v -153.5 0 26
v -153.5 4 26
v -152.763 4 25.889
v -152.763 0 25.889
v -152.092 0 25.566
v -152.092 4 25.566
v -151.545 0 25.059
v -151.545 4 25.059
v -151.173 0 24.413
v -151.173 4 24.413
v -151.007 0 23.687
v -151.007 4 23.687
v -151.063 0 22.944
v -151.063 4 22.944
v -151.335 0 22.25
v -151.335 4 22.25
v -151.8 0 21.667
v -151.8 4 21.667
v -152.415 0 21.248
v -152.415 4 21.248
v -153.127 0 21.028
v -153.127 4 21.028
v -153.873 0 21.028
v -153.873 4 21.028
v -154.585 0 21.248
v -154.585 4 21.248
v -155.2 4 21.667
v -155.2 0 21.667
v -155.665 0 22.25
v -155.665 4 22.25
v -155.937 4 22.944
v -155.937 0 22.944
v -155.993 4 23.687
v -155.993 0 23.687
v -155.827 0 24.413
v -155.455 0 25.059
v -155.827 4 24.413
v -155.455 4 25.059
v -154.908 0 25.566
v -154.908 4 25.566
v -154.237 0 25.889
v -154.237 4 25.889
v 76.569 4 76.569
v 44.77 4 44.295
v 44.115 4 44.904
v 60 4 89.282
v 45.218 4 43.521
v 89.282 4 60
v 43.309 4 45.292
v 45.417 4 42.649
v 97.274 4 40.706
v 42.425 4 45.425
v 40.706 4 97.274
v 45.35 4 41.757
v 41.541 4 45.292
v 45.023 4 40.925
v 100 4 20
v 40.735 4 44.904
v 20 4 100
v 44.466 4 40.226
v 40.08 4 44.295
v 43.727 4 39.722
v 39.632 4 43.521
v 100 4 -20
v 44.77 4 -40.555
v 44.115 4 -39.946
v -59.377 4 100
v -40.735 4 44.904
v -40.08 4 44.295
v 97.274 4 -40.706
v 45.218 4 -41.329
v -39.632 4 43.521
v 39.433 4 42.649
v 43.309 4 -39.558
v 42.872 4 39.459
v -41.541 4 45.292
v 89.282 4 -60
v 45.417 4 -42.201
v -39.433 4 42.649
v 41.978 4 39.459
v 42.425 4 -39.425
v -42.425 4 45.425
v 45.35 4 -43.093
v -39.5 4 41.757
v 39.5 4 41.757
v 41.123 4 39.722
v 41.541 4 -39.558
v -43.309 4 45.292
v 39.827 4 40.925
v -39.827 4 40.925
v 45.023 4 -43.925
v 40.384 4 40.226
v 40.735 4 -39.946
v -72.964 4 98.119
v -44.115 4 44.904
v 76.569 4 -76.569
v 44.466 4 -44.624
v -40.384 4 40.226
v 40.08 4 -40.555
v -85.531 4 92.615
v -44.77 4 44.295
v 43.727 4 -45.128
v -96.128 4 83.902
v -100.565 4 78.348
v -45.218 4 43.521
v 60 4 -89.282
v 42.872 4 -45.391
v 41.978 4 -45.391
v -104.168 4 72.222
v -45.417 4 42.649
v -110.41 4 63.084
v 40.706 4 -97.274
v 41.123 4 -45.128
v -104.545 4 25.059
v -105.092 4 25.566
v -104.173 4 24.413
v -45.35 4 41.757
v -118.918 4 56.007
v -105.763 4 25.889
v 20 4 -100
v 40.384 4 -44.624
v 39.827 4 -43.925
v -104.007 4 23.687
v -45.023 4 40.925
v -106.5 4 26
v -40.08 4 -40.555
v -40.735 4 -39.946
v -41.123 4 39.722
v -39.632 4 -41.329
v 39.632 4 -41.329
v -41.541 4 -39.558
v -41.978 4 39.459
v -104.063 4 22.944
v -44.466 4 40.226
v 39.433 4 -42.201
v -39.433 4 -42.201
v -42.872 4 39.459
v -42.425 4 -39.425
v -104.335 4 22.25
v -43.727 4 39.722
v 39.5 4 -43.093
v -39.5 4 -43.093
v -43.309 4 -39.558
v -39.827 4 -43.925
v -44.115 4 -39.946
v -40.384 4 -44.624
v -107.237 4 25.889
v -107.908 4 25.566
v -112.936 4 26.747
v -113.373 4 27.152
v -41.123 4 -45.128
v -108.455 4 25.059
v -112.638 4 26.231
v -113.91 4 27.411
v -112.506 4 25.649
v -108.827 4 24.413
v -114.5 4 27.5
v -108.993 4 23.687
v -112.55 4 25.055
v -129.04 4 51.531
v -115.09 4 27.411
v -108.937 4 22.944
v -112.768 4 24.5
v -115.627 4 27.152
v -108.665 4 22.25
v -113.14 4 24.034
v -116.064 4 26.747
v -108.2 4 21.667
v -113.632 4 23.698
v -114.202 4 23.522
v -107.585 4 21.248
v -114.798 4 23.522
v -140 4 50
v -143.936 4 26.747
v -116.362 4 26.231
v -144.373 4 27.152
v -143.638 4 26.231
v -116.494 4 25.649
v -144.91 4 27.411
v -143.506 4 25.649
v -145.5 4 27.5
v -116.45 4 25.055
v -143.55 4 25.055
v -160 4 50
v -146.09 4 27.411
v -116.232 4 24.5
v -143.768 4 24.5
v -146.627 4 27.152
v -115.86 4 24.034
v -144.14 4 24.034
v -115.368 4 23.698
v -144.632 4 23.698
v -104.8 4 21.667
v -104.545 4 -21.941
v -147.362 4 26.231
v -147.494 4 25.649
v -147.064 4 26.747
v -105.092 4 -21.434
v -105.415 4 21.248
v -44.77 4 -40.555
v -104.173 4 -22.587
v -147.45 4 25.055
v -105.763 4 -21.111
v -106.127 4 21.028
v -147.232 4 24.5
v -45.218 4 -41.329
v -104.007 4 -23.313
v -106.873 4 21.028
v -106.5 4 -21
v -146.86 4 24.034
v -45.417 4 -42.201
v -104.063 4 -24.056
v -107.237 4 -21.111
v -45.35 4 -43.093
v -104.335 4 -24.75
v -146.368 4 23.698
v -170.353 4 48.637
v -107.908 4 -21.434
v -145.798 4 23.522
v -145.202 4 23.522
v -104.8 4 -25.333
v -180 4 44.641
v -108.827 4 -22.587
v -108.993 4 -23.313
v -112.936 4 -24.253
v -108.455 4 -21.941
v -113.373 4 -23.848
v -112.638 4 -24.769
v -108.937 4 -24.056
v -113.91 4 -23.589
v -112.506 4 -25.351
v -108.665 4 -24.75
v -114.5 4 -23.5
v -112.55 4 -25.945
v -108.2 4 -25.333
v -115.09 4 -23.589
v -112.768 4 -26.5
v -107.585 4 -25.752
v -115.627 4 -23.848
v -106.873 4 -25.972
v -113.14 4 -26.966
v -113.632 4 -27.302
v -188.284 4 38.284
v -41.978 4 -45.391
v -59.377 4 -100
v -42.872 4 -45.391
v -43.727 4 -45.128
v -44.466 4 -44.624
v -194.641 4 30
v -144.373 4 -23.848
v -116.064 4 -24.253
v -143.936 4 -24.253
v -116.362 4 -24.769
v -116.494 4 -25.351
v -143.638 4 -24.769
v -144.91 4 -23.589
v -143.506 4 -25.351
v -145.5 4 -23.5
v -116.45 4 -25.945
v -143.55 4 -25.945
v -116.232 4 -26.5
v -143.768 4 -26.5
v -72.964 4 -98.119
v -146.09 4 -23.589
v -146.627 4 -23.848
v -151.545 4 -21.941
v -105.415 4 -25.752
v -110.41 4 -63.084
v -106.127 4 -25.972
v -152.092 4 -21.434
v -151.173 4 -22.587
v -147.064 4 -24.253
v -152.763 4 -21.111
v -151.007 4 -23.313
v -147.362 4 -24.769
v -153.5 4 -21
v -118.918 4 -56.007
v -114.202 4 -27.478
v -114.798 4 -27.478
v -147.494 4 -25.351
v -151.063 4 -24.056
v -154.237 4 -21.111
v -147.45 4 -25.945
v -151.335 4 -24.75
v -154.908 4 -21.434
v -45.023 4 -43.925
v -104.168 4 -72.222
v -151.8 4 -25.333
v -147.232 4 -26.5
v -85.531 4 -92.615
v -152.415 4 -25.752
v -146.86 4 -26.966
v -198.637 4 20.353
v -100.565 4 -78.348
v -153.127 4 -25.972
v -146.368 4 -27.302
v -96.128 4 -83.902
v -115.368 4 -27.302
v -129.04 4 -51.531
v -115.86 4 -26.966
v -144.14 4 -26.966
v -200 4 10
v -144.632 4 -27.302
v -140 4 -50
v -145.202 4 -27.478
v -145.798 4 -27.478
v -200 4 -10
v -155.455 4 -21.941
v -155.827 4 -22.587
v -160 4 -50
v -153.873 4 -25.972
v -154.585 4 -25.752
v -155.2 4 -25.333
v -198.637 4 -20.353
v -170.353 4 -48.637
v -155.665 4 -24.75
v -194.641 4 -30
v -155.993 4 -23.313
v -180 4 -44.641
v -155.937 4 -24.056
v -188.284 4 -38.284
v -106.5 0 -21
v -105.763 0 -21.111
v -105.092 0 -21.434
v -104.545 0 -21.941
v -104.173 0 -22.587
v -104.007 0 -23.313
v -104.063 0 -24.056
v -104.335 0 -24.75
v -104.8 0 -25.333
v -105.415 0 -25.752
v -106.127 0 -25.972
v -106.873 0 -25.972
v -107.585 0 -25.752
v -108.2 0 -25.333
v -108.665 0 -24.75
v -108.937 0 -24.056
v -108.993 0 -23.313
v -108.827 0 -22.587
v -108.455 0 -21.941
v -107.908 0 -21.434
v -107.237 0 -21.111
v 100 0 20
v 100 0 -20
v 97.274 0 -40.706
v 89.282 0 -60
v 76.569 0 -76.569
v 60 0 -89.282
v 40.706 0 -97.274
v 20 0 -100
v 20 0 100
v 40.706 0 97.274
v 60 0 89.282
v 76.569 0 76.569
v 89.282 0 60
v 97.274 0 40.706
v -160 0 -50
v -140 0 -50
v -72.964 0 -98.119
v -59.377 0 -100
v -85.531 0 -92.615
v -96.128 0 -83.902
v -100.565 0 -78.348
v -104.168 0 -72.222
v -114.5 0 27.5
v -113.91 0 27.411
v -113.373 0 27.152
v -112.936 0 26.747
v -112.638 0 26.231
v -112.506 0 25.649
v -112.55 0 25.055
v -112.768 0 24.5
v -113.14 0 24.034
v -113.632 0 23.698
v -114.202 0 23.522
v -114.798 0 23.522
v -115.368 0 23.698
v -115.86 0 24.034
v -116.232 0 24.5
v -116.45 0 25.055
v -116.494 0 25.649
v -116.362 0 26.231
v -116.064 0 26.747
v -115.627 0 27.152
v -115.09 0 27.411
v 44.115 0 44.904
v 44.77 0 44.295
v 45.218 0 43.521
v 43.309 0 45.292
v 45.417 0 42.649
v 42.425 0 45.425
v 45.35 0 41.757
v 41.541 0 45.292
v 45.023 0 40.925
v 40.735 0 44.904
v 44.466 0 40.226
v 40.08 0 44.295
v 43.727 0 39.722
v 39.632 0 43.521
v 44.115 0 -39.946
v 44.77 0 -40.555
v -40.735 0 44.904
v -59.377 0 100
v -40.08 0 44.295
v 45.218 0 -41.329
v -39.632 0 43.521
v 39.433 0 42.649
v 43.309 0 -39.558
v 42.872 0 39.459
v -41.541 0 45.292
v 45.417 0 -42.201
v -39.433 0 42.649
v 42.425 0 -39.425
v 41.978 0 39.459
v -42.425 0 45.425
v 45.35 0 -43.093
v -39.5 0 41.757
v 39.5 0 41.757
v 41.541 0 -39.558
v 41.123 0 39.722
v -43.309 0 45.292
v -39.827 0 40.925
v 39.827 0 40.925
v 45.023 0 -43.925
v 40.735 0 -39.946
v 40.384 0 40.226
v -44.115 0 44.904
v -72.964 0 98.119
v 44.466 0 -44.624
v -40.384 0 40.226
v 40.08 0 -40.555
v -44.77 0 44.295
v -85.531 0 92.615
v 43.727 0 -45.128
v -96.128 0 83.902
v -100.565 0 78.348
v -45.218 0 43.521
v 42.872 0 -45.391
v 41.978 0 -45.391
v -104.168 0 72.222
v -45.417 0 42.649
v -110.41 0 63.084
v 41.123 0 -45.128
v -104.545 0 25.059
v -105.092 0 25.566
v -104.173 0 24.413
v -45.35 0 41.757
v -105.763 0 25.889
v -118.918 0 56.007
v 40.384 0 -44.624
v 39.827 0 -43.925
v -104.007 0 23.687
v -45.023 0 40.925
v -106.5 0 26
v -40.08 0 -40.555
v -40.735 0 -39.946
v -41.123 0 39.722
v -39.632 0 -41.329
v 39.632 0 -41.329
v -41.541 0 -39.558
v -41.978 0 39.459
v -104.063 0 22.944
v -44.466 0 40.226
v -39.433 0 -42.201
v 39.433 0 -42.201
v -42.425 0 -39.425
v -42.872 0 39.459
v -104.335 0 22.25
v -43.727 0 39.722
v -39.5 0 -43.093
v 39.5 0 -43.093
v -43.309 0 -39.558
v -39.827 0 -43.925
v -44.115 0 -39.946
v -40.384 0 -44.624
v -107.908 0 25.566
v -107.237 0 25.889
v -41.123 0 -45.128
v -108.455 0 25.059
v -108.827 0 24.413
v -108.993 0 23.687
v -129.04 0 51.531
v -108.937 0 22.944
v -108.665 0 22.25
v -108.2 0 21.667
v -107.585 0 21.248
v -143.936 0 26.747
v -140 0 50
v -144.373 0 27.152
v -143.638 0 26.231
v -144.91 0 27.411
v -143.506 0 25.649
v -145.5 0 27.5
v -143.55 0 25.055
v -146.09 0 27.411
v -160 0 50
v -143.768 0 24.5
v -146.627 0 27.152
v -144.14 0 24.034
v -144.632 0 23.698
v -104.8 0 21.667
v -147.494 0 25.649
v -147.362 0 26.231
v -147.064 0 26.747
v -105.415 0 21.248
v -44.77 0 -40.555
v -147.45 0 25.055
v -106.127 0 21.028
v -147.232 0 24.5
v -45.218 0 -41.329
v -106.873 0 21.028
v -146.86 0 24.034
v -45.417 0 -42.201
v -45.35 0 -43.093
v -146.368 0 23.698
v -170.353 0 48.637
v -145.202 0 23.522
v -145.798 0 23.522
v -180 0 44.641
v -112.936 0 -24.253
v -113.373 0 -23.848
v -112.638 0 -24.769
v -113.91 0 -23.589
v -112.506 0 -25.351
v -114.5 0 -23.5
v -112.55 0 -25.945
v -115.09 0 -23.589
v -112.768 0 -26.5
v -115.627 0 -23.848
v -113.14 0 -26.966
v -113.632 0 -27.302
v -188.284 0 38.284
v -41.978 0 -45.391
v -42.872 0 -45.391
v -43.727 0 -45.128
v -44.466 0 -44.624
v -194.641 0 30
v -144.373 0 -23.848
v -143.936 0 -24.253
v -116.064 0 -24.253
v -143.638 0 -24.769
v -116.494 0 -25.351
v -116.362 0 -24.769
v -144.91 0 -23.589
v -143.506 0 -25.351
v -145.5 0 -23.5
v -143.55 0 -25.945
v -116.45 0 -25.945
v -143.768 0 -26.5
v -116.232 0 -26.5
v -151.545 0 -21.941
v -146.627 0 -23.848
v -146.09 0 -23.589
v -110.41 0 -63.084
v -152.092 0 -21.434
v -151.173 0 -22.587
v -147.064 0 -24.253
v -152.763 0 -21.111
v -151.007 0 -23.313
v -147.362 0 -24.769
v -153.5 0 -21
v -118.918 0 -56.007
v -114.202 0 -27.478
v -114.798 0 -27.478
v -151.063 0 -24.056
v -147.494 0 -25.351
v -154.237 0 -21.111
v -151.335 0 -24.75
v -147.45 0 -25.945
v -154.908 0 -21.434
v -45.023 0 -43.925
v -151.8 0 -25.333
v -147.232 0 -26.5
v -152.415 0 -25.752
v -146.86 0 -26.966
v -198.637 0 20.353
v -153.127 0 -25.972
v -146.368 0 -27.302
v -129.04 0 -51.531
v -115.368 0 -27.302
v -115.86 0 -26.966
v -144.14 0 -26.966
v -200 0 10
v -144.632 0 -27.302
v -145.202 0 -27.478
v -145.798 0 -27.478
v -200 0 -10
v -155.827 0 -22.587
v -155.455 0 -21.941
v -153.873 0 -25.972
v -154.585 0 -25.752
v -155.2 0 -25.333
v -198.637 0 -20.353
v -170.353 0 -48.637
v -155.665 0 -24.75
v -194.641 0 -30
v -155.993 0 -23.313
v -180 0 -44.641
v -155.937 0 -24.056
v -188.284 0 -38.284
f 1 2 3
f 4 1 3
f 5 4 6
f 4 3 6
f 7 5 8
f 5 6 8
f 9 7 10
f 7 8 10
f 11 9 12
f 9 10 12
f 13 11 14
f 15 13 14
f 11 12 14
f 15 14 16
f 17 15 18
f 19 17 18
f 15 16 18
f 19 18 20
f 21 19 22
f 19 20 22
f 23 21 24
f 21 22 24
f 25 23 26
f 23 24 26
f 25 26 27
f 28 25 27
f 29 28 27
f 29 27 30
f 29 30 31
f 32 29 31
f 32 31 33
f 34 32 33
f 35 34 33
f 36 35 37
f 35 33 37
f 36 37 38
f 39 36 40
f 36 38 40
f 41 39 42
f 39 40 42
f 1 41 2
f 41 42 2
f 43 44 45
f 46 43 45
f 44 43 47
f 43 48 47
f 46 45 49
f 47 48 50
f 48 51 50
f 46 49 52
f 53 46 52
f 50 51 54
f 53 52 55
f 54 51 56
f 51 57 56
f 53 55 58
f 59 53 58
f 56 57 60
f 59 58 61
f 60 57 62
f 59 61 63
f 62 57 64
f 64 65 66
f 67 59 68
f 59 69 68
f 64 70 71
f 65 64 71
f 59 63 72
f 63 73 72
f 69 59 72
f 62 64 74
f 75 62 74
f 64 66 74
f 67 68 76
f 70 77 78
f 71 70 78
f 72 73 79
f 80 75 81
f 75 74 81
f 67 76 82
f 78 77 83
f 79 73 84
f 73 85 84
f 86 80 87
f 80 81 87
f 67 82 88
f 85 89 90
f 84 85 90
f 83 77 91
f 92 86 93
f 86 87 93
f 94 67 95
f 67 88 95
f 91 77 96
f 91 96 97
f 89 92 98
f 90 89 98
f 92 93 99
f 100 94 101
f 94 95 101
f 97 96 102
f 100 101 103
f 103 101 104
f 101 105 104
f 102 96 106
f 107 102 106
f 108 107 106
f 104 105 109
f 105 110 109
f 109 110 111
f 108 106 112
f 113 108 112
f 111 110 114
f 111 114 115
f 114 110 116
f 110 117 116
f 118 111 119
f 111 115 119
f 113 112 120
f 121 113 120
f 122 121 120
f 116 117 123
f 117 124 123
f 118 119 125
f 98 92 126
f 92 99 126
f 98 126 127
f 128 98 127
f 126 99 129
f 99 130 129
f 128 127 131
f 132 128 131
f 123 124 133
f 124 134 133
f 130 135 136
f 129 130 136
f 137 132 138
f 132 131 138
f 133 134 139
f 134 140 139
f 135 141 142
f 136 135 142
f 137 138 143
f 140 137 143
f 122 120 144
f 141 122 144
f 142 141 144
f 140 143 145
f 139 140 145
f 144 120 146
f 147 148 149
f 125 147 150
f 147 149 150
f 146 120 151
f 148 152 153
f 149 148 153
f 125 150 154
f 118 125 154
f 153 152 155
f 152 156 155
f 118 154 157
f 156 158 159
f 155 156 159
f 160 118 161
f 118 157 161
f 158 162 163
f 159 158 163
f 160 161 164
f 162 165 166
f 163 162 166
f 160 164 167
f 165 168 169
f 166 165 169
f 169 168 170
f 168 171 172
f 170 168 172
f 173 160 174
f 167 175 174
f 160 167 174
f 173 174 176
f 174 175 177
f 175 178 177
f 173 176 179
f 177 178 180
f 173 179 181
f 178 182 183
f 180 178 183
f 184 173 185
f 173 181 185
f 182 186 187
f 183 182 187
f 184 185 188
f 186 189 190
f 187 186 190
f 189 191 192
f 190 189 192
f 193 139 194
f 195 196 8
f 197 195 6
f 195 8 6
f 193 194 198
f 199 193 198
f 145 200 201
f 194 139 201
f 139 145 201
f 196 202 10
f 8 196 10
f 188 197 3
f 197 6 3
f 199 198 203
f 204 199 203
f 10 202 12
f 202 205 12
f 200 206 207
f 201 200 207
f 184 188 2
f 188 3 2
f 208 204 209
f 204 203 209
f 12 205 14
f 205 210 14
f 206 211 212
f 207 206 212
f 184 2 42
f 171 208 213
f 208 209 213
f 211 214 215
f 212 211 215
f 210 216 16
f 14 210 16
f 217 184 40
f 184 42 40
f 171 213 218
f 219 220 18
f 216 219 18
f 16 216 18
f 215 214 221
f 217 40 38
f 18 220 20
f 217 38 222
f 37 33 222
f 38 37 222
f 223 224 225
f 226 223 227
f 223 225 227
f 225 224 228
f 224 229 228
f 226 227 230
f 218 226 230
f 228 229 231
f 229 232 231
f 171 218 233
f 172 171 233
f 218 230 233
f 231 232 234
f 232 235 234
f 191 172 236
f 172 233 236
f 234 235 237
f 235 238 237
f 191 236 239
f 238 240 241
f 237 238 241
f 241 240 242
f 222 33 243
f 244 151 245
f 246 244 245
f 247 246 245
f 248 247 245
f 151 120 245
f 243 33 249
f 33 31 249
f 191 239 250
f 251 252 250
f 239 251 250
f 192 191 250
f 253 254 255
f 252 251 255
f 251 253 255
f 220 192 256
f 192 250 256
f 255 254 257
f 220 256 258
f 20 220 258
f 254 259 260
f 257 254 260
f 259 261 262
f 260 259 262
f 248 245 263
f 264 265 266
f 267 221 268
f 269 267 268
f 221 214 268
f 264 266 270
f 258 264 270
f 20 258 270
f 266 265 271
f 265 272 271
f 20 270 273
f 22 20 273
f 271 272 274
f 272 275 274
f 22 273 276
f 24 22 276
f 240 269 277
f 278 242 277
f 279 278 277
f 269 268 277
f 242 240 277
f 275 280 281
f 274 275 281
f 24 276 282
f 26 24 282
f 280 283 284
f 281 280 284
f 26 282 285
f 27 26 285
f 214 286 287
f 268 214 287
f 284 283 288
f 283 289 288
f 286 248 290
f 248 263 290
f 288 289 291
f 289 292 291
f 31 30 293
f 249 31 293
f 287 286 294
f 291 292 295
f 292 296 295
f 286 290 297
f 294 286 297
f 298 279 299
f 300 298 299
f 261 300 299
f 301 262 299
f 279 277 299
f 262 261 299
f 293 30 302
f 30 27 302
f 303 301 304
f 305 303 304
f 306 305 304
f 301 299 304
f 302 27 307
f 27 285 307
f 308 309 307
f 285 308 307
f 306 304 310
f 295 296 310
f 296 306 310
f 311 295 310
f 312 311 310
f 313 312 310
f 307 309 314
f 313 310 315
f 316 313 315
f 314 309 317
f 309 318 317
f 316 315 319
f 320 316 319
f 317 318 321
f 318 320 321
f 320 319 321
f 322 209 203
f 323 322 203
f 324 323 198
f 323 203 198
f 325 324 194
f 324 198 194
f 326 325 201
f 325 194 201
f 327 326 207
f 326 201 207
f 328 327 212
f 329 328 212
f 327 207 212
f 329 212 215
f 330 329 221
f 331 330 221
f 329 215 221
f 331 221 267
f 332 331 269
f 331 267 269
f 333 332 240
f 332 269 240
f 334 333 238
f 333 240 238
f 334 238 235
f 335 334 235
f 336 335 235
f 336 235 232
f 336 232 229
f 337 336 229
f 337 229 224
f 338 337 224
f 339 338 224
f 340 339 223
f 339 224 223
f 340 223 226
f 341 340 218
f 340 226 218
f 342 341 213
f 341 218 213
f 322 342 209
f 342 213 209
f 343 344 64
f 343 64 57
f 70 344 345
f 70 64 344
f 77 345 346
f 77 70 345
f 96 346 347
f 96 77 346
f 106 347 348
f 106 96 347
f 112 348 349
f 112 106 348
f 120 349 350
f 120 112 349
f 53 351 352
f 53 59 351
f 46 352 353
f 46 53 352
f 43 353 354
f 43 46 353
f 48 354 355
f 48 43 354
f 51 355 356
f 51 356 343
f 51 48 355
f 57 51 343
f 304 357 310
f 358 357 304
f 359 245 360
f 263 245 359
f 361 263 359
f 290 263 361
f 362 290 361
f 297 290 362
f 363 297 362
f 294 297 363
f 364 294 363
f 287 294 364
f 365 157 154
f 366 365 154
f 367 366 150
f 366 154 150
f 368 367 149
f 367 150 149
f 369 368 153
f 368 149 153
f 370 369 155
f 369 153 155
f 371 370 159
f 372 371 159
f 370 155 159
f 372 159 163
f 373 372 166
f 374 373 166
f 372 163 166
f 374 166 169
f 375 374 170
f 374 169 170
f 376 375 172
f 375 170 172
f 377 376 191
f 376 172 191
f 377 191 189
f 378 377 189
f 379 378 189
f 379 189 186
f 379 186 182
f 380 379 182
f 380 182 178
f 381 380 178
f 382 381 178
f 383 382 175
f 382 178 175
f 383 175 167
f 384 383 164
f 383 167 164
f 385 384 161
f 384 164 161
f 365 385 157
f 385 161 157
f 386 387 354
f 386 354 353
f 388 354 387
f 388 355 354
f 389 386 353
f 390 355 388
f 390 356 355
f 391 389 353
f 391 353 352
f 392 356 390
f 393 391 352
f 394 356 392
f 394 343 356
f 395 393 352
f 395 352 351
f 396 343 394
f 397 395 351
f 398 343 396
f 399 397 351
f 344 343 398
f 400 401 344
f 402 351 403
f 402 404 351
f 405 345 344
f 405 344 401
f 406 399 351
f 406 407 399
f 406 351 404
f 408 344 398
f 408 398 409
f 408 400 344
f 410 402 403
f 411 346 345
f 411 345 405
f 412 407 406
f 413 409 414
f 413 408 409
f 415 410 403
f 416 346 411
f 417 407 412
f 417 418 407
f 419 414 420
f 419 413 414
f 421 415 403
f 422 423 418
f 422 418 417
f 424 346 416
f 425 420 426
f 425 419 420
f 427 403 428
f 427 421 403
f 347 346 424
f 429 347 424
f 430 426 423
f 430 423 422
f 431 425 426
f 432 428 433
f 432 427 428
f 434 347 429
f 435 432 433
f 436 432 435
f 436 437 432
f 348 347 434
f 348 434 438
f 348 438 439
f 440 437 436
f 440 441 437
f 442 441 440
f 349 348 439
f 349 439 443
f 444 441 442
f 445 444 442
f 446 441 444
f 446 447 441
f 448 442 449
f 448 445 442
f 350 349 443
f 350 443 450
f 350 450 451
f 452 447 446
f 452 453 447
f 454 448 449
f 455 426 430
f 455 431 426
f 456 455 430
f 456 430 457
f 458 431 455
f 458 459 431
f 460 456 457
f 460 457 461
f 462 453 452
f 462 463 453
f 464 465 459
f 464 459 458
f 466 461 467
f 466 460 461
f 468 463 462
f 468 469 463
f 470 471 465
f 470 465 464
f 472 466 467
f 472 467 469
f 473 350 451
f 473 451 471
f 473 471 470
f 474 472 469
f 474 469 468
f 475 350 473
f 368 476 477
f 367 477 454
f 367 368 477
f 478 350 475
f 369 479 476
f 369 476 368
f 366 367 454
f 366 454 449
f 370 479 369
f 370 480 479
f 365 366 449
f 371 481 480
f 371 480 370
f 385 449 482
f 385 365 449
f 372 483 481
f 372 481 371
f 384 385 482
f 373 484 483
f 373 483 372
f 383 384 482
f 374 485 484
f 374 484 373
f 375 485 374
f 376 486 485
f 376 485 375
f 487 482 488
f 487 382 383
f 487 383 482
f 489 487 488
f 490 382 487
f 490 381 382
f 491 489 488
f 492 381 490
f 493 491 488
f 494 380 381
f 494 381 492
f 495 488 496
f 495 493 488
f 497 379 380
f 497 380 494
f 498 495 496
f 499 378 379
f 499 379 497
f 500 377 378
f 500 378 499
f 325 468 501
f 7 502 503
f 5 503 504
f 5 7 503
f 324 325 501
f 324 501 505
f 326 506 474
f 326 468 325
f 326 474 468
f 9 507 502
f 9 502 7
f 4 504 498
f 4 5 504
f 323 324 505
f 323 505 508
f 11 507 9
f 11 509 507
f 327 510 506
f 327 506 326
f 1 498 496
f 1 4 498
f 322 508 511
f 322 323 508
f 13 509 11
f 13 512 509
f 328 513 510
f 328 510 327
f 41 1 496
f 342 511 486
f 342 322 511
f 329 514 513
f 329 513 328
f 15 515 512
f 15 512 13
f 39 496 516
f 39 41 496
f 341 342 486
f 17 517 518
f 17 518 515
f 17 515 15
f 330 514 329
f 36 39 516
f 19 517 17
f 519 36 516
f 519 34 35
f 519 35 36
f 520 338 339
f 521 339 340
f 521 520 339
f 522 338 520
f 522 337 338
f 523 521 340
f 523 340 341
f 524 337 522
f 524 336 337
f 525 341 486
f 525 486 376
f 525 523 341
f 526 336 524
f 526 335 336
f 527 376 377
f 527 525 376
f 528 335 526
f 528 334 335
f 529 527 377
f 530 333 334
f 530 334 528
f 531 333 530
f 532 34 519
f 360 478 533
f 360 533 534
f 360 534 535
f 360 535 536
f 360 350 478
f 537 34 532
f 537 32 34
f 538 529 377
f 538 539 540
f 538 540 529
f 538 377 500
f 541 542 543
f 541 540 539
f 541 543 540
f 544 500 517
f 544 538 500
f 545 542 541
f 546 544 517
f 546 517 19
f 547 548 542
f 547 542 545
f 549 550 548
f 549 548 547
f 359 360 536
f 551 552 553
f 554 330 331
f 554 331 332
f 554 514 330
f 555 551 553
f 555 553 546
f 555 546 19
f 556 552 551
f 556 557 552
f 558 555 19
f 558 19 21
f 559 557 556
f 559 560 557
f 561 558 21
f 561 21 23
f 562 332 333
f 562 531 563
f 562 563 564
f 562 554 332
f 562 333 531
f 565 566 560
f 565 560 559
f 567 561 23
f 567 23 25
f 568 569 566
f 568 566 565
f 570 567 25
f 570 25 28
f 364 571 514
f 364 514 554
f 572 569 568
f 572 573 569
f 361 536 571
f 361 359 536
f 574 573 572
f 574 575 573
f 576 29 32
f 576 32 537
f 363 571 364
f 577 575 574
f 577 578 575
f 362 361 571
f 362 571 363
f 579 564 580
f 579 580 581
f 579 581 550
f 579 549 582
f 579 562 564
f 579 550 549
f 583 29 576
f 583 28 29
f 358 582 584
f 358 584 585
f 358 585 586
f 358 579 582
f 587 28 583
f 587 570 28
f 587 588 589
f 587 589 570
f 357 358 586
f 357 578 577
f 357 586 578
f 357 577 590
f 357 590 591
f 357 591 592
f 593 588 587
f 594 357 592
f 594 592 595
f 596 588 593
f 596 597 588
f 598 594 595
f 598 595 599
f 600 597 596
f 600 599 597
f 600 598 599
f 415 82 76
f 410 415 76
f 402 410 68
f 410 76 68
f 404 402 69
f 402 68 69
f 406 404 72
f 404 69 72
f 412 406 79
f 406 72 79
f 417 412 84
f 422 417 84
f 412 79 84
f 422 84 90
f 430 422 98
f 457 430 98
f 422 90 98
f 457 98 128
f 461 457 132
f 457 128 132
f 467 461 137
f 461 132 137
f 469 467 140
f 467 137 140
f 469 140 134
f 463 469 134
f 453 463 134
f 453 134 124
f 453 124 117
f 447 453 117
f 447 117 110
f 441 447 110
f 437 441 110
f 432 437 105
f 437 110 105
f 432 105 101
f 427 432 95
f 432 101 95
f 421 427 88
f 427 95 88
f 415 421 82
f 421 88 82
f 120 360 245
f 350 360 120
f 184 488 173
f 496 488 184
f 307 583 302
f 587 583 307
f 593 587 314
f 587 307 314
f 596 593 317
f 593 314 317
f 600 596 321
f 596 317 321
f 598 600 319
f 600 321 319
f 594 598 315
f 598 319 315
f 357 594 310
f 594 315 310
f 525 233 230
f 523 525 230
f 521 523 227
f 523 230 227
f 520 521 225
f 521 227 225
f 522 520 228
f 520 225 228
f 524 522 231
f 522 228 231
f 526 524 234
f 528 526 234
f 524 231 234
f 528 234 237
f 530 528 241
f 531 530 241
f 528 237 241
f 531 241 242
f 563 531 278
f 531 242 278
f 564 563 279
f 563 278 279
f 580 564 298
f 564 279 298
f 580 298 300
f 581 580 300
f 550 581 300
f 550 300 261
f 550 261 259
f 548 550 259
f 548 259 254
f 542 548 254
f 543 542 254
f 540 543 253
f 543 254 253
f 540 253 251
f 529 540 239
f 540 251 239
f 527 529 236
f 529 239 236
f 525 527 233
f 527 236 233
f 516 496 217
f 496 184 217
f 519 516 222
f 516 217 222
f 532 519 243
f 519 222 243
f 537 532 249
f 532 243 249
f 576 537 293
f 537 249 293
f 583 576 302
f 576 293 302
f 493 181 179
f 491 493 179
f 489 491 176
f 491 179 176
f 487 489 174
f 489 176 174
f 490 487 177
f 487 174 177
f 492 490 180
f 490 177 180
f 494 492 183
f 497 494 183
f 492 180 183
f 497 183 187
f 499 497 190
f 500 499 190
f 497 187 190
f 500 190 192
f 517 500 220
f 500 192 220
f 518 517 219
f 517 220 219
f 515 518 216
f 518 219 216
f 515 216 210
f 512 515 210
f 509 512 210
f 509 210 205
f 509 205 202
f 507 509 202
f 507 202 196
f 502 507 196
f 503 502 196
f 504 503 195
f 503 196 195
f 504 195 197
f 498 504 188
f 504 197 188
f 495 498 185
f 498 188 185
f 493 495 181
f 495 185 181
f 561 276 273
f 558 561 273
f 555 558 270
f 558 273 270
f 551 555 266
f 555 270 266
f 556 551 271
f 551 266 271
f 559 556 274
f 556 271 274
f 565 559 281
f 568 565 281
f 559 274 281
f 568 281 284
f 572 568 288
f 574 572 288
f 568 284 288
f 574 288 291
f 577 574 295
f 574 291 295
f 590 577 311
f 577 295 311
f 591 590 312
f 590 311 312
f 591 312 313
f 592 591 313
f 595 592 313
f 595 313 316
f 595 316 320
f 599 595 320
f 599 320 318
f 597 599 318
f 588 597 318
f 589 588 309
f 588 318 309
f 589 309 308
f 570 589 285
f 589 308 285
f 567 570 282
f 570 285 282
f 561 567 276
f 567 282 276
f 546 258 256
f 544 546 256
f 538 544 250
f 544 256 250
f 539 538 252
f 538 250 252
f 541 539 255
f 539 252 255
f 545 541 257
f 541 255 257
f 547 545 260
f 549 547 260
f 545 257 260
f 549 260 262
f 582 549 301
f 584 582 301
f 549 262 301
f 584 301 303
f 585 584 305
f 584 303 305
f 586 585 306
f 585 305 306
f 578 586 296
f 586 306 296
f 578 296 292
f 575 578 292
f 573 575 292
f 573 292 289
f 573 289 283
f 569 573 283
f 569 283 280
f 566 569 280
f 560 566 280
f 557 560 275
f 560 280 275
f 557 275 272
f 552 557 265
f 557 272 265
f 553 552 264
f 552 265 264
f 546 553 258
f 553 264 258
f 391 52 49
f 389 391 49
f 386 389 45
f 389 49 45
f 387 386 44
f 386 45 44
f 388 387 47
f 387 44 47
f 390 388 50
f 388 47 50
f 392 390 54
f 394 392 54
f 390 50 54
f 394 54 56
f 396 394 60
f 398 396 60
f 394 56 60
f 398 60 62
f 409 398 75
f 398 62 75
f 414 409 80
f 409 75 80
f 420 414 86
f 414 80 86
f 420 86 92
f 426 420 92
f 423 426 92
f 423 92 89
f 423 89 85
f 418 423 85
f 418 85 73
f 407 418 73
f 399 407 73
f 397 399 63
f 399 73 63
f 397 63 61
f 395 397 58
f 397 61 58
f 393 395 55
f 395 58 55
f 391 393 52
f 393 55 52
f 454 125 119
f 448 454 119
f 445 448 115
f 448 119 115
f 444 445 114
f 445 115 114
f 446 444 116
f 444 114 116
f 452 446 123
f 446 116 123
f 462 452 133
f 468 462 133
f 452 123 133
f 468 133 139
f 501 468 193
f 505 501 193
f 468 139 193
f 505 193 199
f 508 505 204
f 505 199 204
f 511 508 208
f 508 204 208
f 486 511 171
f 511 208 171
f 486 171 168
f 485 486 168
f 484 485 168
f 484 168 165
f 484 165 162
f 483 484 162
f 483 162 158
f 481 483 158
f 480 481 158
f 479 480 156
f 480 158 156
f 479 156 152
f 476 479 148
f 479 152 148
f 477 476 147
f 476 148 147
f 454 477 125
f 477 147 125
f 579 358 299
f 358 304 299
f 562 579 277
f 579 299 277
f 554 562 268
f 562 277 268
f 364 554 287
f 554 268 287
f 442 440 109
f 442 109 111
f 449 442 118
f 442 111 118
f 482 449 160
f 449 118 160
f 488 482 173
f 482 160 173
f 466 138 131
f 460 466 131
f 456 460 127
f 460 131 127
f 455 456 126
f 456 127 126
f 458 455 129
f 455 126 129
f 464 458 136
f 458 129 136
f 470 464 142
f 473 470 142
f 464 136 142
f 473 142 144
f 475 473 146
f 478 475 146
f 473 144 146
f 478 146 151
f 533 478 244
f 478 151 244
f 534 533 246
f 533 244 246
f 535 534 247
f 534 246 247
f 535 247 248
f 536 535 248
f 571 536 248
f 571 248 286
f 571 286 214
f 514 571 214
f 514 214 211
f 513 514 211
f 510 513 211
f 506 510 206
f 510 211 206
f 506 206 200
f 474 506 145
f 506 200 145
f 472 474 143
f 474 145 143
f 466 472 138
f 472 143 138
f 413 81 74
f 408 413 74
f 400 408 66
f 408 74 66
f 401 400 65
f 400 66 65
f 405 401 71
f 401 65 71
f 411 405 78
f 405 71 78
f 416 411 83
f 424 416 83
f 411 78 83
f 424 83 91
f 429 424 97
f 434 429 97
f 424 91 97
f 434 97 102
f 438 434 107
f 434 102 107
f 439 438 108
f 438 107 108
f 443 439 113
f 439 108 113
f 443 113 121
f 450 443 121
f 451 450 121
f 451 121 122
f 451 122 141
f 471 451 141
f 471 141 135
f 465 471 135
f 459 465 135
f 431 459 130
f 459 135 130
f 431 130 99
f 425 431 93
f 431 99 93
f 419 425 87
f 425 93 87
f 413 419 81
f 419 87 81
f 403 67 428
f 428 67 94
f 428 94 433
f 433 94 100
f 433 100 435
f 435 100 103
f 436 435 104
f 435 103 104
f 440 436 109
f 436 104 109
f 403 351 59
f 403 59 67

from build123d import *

# Parameters (mm, degrees)
BOSS_EXTRUDE1_DEPTH = 4
FILLET1_R           = 40
SKETCH2_R           = 3
CUT_EXTRUDE1_DEPTH  = 4
SKETCH3_R           = 2
SKETCH3_R_2         = 2.5
CUT_EXTRUDE2_DEPTH  = 4
FILLET2_R           = 80
FILLET3_R           = 50


with BuildPart() as part:
    # Sketch1 → Boss-Extrude1 (new body)
    with BuildSketch(Plane(origin=(0, 0, 0), x_dir=(1, 0, 0), z_dir=(0, 1, 0))):
        Polygon((-100, 100), (100, 100), (100, -100), (-100, -100), (-100, -50), (-200, -50), (-200, 50), (-100, 50), align=None)
    extrude(amount=BOSS_EXTRUDE1_DEPTH)

    # Fillet1
    fillet1_edges = [part.edges().sort_by_distance(p)[0] for p in [
        (-100, 2, 50),
        (-200, 2, 50),
        (-200, 2, -50),
        (-100, 2, -50),
    ]]
    fillet(fillet1_edges, radius=FILLET1_R)

    # Sketch2 → Cut-Extrude1 (cut)
    with BuildSketch(Plane(origin=(0, 4, 0), x_dir=(1, 0, 0), z_dir=(0, 1, 0))):
        with Locations(Location((42.425, 42.425, 0), (0, 0, 270))):
            Circle(SKETCH2_R)
        with Locations(Location((42.425, -42.425, 0), (0, 0, 270))):
            Circle(SKETCH2_R)
        with Locations(Location((-42.425, -42.425, 0), (0, 0, 270))):
            Circle(SKETCH2_R)
        with Locations(Location((-42.425, 42.425, 0), (0, 0, 270))):
            Circle(SKETCH2_R)
    extrude(amount=-CUT_EXTRUDE1_DEPTH, mode=Mode.SUBTRACT)

    # Sketch3 → Cut-Extrude2 (cut)
    with BuildSketch(Plane(origin=(0, 4, 0), x_dir=(1, 0, 0), z_dir=(0, 1, 0))):
        with Locations(Location((-114.5, -25.5, 0), (0, 0, 270))):
            Circle(SKETCH3_R)
        with Locations(Location((-106.5, 23.5, 0), (0, 0, 270))):
            Circle(SKETCH3_R_2)
        with Locations(Location((-153.5, 23.5, 0), (0, 0, 270))):
            Circle(SKETCH3_R_2)
        with Locations(Location((-153.5, -23.5, 0), (0, 0, 270))):
            Circle(SKETCH3_R_2)
        with Locations(Location((-106.5, -23.5, 0), (0, 0, 270))):
            Circle(SKETCH3_R_2)
        with Locations(Location((-145.5, -25.5, 0), (0, 0, 270))):
            Circle(SKETCH3_R)
        with Locations(Location((-145.5, 25.5, 0), (0, 0, 270))):
            Circle(SKETCH3_R)
        with Locations(Location((-114.5, 25.5, 0), (0, 0, 270))):
            Circle(SKETCH3_R)
    extrude(amount=-CUT_EXTRUDE2_DEPTH, mode=Mode.SUBTRACT)

    # Fillet2
    fillet2_edges = [part.edges().sort_by_distance(p)[0] for p in [
        (100, 2, 100),
        (100, 2, -100),
    ]]
    fillet(fillet2_edges, radius=FILLET2_R)

    # Fillet3
    fillet3_edges = [part.edges().sort_by_distance(p)[0] for p in [
        (-100, 2, -100),
        (-100, 2, 100),
    ]]
    fillet(fillet3_edges, radius=FILLET3_R)


solid = part.part
